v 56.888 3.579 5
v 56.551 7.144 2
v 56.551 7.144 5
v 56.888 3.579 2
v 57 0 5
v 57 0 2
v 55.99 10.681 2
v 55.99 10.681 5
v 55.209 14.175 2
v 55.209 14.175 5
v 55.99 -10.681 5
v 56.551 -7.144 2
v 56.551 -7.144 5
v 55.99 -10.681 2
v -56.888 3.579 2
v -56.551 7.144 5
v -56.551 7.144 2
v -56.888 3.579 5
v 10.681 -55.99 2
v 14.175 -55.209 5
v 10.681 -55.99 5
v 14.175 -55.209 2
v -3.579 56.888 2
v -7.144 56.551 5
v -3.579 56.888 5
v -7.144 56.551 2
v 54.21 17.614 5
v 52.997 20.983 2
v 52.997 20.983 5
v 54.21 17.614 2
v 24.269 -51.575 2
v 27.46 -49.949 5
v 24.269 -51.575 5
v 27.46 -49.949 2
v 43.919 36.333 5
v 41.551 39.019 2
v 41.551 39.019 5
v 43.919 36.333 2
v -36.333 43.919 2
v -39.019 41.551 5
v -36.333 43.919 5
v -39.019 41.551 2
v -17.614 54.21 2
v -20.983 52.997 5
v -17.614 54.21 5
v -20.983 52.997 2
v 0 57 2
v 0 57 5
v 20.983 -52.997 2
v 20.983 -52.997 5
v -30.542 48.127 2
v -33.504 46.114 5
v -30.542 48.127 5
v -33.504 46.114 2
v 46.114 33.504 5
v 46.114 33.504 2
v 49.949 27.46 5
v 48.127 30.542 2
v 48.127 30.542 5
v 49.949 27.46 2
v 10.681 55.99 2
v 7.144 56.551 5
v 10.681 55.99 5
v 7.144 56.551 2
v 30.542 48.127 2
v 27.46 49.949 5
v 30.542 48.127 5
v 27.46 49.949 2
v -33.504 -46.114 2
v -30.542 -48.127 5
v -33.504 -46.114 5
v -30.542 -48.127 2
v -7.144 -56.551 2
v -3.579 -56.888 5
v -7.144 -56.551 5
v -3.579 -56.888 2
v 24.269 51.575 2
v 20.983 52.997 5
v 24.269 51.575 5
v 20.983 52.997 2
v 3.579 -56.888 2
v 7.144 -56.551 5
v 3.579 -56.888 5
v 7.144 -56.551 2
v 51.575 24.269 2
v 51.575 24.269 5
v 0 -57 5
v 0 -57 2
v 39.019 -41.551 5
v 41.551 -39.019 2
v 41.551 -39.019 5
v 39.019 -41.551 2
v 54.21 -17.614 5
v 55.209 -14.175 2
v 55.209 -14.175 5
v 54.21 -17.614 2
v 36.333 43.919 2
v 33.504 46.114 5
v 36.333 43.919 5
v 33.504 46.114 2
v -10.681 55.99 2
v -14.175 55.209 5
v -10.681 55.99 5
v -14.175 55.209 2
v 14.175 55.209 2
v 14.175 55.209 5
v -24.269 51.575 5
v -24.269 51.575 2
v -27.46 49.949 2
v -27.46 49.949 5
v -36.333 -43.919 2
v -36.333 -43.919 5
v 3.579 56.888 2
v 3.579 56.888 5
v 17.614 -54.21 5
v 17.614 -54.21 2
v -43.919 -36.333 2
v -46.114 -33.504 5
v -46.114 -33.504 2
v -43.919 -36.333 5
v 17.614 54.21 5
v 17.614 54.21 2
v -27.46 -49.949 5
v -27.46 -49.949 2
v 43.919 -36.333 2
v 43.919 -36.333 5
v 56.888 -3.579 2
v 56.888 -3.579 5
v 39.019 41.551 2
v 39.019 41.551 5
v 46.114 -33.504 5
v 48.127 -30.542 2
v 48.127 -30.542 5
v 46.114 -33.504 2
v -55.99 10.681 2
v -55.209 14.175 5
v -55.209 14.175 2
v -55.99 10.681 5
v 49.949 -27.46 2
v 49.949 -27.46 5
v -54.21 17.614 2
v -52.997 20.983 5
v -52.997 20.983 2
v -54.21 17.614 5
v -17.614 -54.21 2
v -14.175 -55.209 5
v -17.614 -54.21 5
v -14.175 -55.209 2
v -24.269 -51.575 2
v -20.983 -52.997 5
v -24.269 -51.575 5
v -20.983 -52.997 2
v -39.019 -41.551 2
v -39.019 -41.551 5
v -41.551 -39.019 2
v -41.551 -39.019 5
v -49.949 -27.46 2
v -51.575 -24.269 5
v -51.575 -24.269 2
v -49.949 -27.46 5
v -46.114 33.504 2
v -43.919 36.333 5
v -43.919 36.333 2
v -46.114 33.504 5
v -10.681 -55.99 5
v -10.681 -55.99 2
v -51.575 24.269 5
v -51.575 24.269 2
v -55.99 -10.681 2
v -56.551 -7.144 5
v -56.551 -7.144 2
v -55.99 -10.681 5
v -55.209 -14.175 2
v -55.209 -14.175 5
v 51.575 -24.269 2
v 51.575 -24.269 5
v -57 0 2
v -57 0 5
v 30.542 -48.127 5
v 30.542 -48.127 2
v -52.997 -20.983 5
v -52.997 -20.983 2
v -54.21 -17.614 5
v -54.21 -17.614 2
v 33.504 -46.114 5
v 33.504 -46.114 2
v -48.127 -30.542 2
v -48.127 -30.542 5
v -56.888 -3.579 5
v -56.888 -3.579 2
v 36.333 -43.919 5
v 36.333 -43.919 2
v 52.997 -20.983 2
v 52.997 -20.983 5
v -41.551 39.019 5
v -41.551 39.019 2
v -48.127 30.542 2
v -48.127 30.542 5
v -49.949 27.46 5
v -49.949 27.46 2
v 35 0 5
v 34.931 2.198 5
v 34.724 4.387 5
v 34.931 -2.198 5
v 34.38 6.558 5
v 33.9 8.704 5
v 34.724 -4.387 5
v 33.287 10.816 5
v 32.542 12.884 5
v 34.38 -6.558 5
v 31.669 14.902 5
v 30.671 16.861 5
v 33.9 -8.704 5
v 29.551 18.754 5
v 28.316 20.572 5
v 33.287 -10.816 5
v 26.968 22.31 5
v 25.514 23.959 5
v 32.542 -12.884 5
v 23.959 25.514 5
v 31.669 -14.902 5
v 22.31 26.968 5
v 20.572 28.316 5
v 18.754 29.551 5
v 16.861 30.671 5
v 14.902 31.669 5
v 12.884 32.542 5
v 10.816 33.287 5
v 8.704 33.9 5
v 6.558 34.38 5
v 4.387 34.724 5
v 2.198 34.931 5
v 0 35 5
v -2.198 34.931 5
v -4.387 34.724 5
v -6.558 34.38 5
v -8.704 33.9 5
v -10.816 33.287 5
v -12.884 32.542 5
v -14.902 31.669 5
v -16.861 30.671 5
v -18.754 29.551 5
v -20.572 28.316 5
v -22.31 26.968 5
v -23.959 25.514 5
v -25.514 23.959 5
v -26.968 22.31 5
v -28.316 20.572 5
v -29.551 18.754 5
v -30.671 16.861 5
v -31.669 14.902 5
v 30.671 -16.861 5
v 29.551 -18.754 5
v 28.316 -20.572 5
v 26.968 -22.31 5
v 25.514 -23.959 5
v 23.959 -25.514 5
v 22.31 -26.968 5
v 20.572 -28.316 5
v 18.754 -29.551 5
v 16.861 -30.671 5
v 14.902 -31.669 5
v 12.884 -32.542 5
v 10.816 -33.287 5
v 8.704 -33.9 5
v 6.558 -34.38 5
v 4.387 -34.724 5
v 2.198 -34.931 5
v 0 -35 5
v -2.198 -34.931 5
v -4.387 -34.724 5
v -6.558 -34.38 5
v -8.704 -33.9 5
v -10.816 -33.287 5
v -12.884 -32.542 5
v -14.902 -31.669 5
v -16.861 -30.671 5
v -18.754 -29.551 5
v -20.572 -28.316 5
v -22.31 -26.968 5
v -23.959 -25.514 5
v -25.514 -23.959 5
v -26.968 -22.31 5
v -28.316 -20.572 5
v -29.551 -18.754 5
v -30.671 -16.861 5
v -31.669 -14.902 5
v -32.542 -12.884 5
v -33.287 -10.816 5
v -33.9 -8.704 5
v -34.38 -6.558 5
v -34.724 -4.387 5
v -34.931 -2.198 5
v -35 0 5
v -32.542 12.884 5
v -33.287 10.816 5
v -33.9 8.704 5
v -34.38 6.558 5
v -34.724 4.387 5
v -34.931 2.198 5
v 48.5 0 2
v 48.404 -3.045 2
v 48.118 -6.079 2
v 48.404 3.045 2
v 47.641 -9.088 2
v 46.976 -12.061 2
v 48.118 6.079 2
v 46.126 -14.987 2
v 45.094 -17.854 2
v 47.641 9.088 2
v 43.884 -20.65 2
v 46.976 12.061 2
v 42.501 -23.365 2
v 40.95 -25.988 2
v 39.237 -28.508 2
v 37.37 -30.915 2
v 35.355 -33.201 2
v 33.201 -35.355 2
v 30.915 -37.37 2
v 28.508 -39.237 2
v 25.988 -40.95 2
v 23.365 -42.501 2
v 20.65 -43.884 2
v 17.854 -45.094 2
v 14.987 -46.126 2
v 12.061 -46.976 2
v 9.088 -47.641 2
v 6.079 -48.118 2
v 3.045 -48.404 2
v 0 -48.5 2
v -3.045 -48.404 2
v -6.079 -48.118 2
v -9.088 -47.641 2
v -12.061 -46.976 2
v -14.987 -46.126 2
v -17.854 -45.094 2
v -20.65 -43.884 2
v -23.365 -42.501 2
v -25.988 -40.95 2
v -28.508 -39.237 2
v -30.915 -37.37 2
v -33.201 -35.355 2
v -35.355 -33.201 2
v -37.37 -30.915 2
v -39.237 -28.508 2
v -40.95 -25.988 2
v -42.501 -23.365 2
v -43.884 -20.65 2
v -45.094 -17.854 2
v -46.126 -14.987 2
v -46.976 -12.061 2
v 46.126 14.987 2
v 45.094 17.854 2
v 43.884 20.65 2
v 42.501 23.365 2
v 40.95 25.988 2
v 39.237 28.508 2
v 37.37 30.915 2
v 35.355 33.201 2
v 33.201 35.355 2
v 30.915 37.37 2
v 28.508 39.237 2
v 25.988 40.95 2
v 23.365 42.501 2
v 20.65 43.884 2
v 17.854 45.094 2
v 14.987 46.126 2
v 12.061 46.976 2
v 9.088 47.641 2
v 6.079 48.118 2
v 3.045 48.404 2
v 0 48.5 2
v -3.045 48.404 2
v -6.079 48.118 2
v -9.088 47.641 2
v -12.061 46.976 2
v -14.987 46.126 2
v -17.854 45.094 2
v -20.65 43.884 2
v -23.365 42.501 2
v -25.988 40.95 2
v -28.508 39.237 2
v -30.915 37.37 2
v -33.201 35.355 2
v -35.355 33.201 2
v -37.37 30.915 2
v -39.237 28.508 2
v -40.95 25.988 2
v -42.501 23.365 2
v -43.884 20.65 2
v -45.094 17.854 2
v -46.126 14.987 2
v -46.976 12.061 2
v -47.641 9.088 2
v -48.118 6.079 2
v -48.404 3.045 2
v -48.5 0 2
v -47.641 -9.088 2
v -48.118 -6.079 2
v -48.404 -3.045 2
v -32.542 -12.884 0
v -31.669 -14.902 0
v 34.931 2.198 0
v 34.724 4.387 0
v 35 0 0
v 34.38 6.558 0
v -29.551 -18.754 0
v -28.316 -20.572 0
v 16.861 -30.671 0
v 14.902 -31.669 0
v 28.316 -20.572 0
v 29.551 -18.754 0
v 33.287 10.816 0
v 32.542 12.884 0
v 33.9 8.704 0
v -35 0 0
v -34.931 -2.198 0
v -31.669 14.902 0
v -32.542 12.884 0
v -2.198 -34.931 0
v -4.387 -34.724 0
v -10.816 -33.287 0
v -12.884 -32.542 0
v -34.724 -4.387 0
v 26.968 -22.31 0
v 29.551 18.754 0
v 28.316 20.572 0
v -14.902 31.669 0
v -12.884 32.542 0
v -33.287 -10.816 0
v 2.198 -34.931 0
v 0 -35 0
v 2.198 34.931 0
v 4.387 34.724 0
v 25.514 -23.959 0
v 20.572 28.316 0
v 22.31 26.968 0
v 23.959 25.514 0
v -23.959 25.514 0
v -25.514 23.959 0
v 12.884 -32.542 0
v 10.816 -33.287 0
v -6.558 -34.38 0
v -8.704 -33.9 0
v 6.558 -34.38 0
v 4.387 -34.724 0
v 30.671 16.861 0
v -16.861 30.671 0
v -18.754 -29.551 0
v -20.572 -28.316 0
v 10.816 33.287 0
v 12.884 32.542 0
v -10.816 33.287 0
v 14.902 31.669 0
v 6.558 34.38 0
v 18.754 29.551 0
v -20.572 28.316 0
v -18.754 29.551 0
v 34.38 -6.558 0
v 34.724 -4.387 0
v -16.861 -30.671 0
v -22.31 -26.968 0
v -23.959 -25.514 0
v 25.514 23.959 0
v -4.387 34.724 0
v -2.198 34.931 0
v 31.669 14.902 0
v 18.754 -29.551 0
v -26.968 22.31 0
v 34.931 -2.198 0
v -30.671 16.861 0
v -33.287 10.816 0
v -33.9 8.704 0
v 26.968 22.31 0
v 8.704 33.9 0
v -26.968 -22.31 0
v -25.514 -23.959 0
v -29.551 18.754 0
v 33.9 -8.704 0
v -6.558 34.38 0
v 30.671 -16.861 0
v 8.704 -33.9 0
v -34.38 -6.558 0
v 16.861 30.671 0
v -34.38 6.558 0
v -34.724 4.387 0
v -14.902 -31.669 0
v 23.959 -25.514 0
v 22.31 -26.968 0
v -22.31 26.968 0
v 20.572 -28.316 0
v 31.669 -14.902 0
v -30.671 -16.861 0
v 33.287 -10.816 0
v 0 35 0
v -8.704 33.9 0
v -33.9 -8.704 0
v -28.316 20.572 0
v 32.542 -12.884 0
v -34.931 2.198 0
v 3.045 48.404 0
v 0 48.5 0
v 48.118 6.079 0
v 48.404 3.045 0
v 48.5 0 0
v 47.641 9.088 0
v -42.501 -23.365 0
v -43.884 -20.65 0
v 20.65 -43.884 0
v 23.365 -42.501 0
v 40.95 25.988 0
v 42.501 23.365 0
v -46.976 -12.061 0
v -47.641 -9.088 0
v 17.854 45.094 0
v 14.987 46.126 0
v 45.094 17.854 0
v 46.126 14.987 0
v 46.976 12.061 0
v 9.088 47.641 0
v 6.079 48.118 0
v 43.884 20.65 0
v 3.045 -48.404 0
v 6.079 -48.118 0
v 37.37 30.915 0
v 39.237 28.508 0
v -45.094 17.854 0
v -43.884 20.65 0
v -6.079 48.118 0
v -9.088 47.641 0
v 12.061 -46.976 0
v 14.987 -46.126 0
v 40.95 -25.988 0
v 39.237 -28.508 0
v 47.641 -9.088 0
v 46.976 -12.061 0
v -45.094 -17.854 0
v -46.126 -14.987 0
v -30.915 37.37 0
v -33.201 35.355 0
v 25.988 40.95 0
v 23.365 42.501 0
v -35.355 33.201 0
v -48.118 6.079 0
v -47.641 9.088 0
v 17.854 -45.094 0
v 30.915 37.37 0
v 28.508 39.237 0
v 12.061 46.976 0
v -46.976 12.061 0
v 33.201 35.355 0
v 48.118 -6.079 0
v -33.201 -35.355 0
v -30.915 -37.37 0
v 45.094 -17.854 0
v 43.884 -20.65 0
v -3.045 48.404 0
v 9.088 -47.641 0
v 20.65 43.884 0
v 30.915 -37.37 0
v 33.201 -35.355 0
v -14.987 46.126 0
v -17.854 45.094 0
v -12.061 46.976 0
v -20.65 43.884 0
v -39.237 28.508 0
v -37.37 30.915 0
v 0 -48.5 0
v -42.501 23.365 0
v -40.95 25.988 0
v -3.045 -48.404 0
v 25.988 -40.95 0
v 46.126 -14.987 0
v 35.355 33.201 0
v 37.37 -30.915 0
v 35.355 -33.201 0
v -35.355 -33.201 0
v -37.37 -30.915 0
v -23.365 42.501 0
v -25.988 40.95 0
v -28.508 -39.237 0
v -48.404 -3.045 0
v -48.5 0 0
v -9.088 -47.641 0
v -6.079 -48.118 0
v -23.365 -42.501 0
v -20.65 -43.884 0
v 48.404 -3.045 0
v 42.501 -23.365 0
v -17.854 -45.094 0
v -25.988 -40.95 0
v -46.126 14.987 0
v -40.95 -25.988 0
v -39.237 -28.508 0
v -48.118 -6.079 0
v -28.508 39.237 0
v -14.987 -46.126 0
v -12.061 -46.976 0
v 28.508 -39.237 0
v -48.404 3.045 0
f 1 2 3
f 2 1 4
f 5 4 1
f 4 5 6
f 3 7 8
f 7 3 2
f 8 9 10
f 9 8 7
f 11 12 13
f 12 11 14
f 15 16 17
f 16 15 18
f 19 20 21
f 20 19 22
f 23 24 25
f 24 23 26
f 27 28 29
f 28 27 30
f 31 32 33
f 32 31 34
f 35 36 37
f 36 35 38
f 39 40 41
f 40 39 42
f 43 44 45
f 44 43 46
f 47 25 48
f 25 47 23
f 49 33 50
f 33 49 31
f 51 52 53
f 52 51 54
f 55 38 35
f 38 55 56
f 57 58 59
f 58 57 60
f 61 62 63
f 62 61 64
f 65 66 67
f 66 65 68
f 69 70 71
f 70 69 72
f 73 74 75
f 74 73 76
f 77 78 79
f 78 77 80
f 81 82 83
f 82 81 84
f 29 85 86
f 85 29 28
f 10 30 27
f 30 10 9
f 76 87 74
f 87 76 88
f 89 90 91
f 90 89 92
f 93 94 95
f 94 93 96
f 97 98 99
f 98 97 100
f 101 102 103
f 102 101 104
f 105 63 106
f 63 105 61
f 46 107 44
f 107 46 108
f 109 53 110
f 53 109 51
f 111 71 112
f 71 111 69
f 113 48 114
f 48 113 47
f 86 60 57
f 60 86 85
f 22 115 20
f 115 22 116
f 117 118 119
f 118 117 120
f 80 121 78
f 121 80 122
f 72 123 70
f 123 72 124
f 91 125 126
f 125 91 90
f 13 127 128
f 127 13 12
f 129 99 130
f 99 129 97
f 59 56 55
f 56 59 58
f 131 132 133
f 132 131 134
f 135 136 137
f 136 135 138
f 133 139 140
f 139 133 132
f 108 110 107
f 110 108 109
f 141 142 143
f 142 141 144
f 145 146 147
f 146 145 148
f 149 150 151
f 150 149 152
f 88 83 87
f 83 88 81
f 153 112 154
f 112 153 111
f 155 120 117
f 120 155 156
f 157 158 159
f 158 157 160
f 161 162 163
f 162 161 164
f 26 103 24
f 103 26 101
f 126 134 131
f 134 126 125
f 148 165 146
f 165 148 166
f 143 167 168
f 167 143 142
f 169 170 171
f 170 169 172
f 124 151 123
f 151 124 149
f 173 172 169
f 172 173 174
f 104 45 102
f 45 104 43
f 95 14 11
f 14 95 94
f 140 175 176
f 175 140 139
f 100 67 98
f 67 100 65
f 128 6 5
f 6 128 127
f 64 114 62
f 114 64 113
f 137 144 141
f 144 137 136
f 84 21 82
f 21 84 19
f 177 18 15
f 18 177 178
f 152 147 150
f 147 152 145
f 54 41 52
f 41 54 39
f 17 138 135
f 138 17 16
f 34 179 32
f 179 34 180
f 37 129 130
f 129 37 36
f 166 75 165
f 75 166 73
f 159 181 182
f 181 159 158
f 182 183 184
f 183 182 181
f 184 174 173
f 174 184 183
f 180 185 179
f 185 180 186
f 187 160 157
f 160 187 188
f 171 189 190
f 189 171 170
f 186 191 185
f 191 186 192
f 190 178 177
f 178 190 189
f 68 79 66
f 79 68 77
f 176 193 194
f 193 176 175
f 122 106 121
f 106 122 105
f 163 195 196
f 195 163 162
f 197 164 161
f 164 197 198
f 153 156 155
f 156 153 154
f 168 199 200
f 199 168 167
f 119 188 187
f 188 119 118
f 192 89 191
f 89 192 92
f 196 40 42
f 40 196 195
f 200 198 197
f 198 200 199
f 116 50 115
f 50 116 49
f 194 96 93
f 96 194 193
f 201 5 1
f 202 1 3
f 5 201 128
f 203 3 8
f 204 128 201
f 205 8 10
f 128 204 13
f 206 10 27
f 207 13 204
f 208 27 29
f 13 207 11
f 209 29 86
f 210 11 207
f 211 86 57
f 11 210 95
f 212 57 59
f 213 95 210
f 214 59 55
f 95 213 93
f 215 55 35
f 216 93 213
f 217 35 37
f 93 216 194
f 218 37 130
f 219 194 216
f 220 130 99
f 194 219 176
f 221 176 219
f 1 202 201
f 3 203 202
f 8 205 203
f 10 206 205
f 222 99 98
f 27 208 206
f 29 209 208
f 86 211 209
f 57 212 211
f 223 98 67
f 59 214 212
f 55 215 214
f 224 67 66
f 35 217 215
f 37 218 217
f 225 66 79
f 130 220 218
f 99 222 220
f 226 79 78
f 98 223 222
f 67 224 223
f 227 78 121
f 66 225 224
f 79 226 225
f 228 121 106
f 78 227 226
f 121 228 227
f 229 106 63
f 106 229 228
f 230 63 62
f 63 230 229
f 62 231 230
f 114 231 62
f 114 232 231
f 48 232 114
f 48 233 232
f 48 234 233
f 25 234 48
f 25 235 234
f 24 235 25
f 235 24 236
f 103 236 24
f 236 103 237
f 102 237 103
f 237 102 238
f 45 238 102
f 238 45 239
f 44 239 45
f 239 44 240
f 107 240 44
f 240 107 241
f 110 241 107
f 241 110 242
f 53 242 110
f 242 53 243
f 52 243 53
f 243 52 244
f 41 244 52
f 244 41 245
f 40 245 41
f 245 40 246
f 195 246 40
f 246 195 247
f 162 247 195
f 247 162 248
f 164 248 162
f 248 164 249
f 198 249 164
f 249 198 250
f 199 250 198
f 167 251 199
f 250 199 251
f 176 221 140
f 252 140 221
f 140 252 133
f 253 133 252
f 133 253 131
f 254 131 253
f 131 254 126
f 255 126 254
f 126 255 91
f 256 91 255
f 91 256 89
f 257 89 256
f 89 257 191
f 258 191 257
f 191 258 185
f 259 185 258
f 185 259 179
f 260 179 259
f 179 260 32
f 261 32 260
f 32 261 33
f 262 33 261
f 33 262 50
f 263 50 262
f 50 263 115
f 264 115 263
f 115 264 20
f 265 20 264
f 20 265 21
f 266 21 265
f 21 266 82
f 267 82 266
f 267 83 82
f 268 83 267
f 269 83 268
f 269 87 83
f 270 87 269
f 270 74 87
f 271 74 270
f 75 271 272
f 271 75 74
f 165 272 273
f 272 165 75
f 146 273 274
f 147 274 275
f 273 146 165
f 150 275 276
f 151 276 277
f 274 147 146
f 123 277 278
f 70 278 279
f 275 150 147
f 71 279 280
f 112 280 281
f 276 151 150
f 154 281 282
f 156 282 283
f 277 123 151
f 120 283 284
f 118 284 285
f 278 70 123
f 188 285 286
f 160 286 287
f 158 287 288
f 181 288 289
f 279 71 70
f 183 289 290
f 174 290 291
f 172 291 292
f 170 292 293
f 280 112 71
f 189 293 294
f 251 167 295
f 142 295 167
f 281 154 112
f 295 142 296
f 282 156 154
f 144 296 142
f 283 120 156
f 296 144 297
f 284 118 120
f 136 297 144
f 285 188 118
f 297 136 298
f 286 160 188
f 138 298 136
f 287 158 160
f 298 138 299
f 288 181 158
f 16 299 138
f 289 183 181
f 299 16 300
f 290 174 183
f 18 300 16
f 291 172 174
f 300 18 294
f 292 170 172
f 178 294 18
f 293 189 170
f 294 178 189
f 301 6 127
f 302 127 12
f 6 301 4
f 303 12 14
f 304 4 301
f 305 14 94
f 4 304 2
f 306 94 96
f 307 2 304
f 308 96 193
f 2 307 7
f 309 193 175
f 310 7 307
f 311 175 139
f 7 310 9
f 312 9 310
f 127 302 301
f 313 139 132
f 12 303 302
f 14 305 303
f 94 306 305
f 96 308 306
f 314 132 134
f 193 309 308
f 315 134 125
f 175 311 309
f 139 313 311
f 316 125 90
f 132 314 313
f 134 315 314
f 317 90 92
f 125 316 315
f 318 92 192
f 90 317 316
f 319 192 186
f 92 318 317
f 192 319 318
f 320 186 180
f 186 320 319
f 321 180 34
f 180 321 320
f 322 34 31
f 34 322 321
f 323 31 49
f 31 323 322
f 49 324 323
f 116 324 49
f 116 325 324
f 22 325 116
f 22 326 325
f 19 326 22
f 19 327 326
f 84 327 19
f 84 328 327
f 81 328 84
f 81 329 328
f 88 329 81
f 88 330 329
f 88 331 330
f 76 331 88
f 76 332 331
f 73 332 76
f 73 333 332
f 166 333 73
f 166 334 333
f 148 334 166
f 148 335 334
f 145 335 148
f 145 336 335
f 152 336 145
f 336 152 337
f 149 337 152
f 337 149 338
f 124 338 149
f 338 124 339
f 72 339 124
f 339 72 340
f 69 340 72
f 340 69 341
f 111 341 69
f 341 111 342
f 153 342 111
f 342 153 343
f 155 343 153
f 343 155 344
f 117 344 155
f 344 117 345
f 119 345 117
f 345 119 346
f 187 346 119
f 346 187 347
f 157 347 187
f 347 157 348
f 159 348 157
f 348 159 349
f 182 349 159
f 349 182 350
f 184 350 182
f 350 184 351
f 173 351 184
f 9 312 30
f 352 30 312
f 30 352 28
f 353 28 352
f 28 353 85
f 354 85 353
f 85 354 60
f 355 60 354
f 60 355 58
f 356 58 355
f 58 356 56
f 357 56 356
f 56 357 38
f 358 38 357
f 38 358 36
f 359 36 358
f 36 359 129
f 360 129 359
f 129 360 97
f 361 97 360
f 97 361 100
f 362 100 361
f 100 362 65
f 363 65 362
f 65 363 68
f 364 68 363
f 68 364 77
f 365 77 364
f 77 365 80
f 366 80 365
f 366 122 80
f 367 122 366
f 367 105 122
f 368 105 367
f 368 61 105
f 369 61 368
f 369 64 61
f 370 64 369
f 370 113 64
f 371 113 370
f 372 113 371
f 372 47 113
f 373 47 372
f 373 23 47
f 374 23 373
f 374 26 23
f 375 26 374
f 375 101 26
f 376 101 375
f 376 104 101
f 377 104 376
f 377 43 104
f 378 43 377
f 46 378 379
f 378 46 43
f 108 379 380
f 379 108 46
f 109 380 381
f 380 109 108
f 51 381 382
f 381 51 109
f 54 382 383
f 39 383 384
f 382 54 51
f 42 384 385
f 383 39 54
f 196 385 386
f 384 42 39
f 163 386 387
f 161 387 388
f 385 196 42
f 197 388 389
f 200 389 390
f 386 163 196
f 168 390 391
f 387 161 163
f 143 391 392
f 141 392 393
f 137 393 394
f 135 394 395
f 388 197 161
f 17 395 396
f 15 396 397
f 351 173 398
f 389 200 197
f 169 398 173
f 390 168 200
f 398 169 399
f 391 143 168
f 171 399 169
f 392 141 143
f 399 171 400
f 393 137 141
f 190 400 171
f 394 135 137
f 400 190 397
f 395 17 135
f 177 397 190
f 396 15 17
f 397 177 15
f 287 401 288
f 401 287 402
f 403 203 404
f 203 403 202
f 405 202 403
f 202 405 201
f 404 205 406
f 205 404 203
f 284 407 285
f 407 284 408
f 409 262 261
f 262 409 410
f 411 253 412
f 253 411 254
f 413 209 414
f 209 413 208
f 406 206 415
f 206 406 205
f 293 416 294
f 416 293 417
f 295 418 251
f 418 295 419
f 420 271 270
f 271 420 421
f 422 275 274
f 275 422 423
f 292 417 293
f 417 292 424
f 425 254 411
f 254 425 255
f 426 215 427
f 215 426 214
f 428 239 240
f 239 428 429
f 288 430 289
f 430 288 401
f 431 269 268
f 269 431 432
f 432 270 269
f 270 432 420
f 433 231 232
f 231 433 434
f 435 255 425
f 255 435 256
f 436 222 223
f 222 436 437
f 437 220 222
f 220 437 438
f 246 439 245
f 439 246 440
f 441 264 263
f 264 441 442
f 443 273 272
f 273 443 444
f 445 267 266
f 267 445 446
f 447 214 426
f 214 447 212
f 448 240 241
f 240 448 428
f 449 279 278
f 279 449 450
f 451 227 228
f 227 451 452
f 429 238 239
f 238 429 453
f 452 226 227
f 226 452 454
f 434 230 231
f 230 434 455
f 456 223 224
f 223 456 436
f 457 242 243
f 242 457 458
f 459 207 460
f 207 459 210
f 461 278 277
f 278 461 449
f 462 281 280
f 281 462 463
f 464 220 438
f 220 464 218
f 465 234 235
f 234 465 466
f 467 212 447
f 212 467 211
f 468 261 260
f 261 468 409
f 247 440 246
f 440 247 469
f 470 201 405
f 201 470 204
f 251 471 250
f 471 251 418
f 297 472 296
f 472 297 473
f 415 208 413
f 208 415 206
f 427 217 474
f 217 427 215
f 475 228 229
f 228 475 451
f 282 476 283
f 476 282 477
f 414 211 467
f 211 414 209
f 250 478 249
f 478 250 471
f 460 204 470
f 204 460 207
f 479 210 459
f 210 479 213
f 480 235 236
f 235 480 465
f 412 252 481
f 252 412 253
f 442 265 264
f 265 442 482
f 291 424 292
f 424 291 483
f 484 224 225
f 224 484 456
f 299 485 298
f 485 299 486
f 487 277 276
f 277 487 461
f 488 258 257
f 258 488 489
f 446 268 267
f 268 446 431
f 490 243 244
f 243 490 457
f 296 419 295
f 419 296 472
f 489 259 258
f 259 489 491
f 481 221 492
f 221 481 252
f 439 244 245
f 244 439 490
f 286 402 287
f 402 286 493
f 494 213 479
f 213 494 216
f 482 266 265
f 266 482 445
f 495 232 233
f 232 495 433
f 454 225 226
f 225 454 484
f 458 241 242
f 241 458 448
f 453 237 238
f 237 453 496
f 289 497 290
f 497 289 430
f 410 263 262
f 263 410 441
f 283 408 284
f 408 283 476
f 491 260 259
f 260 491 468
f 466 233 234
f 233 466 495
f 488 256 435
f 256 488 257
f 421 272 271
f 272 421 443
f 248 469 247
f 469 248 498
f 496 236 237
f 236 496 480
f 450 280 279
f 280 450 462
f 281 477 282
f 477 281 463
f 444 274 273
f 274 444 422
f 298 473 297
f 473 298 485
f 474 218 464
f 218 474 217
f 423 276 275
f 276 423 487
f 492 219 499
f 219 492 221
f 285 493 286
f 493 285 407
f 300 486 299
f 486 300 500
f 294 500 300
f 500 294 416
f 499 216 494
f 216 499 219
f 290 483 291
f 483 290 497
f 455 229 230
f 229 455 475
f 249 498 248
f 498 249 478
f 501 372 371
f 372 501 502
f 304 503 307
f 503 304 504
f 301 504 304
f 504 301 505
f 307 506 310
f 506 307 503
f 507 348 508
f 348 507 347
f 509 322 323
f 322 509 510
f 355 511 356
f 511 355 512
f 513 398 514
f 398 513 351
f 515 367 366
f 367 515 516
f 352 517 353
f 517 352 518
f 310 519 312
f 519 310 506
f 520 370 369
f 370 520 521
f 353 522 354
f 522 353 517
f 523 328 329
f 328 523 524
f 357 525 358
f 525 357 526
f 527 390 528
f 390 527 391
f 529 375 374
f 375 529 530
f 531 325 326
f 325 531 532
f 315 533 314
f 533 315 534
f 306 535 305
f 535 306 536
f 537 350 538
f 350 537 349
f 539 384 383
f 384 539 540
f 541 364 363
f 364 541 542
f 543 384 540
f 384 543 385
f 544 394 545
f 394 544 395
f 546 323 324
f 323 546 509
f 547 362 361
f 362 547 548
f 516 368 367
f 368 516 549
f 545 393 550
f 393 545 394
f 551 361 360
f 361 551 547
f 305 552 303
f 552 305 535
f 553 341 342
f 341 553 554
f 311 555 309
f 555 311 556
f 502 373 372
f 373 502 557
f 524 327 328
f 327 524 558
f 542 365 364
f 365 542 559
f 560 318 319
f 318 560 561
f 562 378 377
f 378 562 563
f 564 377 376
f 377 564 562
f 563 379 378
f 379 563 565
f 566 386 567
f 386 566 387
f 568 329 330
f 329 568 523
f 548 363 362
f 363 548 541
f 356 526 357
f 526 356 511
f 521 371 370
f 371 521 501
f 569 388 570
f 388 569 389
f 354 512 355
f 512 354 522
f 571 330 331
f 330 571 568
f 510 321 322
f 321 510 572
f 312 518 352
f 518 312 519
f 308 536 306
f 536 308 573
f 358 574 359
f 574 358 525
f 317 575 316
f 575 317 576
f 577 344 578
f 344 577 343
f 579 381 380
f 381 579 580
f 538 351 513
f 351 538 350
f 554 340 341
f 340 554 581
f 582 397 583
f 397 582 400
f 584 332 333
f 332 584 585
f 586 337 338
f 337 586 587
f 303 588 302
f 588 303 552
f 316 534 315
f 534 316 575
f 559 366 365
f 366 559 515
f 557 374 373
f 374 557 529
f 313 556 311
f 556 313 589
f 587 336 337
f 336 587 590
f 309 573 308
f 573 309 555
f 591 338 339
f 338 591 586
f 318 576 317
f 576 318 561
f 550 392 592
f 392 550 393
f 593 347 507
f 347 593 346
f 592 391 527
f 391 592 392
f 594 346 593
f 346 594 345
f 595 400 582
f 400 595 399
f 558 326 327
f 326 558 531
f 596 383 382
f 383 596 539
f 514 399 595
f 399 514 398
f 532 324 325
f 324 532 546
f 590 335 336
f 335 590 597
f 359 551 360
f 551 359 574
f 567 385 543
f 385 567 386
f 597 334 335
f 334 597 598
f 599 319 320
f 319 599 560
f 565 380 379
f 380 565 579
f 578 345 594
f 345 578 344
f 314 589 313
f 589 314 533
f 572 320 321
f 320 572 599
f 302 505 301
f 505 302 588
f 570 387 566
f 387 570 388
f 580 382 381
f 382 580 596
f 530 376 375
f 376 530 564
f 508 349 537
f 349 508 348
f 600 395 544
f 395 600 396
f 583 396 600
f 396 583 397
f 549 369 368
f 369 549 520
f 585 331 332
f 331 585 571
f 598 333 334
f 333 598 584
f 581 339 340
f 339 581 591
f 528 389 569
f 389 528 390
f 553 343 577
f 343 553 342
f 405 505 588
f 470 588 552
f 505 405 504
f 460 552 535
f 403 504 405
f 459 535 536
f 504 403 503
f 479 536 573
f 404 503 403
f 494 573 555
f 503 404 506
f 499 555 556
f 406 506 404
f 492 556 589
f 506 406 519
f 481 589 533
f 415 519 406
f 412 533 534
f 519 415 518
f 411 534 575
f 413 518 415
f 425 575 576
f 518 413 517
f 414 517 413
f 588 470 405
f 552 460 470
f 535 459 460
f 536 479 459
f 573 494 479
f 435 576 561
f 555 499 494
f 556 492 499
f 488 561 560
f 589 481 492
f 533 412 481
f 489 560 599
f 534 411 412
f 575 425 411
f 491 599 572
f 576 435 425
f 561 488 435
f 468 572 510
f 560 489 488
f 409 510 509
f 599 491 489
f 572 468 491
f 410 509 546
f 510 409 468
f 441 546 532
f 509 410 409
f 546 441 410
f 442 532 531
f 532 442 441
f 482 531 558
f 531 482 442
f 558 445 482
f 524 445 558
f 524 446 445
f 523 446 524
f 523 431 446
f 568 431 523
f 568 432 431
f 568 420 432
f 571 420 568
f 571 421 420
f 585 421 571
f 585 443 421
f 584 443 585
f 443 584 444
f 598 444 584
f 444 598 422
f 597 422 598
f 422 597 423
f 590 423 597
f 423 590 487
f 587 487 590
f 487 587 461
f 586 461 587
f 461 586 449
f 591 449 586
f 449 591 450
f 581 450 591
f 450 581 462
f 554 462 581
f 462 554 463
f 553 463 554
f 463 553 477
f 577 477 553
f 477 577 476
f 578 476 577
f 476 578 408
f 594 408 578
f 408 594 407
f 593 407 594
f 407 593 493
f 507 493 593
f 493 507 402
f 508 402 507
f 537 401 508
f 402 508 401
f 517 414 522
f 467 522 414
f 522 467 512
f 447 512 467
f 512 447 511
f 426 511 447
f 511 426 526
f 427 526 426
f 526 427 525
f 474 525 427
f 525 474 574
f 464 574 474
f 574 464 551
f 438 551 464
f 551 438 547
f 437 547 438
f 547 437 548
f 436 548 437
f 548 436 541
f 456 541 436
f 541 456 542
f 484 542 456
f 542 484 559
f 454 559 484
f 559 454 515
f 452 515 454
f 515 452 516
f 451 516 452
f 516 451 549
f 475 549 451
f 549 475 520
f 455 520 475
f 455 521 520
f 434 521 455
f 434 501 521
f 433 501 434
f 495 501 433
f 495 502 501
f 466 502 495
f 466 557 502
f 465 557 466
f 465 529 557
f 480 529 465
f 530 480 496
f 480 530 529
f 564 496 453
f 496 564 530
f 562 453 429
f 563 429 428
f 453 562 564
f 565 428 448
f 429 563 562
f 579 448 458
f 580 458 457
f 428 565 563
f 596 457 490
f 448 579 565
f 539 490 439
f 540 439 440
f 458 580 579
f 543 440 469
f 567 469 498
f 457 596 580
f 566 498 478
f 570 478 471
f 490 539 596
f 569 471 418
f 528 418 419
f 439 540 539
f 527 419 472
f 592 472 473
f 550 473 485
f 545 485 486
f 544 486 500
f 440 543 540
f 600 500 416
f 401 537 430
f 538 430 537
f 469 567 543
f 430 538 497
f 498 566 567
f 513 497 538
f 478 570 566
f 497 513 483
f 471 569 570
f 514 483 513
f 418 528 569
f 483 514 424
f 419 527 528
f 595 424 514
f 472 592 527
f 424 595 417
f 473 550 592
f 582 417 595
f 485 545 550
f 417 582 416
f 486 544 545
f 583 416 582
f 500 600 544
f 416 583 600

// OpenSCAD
/*

 Copyright (C) 2014 Robert Kaye
 Creative Commons License 3.0 BY-SA

 This coffee cup shim can be customized!

 Adjust the following values to fit the cups/coffee equipment you have.
*/

// The outer (plate) diameter of the shim. This should a few mm wider than your coffee cups:
plate_dia = 114; // mm

// The outer diameter of the ridge that fits inside the coffee cup:
ridge_dia = 97; // mm

// The inner diameter of the shim. This should be a few mm larger than the outer diameter of
// your coffee filter cone or Aeropress:
inner_dia = 70; // mm

// How thick the main plate should be. 3mm seems sturdy.
plate_thickness = 3;

// How thick the ridge on the main plate should be. 2mm keeps it from sliding off the cup
ridge_thickness = 2;

// The number of facets to use to render the cylinders. 25 is good for tinkering, 100+ for a final part.
facets = 100;

// No need to edit below this line -------
plate_r = plate_dia / 2;
ridge_r = ridge_dia / 2;
inner_r = inner_dia / 2;

union()
{
	translate([0,0,ridge_thickness])
		upper_cylinder();
    lower_cylinder();
}

module upper_cylinder()
{
	difference()
	{
		cylinder(h = plate_thickness, r = plate_r, $fn=facets);
		cylinder(h = plate_thickness, r = inner_r, $fn=facets);
	}; 
}

module lower_cylinder()
{
    	difference()
	{
		cylinder(h = ridge_thickness, r = ridge_r, $fn=facets);
		cylinder(h = ridge_thickness, r = inner_r, $fn=facets);
	};
}
